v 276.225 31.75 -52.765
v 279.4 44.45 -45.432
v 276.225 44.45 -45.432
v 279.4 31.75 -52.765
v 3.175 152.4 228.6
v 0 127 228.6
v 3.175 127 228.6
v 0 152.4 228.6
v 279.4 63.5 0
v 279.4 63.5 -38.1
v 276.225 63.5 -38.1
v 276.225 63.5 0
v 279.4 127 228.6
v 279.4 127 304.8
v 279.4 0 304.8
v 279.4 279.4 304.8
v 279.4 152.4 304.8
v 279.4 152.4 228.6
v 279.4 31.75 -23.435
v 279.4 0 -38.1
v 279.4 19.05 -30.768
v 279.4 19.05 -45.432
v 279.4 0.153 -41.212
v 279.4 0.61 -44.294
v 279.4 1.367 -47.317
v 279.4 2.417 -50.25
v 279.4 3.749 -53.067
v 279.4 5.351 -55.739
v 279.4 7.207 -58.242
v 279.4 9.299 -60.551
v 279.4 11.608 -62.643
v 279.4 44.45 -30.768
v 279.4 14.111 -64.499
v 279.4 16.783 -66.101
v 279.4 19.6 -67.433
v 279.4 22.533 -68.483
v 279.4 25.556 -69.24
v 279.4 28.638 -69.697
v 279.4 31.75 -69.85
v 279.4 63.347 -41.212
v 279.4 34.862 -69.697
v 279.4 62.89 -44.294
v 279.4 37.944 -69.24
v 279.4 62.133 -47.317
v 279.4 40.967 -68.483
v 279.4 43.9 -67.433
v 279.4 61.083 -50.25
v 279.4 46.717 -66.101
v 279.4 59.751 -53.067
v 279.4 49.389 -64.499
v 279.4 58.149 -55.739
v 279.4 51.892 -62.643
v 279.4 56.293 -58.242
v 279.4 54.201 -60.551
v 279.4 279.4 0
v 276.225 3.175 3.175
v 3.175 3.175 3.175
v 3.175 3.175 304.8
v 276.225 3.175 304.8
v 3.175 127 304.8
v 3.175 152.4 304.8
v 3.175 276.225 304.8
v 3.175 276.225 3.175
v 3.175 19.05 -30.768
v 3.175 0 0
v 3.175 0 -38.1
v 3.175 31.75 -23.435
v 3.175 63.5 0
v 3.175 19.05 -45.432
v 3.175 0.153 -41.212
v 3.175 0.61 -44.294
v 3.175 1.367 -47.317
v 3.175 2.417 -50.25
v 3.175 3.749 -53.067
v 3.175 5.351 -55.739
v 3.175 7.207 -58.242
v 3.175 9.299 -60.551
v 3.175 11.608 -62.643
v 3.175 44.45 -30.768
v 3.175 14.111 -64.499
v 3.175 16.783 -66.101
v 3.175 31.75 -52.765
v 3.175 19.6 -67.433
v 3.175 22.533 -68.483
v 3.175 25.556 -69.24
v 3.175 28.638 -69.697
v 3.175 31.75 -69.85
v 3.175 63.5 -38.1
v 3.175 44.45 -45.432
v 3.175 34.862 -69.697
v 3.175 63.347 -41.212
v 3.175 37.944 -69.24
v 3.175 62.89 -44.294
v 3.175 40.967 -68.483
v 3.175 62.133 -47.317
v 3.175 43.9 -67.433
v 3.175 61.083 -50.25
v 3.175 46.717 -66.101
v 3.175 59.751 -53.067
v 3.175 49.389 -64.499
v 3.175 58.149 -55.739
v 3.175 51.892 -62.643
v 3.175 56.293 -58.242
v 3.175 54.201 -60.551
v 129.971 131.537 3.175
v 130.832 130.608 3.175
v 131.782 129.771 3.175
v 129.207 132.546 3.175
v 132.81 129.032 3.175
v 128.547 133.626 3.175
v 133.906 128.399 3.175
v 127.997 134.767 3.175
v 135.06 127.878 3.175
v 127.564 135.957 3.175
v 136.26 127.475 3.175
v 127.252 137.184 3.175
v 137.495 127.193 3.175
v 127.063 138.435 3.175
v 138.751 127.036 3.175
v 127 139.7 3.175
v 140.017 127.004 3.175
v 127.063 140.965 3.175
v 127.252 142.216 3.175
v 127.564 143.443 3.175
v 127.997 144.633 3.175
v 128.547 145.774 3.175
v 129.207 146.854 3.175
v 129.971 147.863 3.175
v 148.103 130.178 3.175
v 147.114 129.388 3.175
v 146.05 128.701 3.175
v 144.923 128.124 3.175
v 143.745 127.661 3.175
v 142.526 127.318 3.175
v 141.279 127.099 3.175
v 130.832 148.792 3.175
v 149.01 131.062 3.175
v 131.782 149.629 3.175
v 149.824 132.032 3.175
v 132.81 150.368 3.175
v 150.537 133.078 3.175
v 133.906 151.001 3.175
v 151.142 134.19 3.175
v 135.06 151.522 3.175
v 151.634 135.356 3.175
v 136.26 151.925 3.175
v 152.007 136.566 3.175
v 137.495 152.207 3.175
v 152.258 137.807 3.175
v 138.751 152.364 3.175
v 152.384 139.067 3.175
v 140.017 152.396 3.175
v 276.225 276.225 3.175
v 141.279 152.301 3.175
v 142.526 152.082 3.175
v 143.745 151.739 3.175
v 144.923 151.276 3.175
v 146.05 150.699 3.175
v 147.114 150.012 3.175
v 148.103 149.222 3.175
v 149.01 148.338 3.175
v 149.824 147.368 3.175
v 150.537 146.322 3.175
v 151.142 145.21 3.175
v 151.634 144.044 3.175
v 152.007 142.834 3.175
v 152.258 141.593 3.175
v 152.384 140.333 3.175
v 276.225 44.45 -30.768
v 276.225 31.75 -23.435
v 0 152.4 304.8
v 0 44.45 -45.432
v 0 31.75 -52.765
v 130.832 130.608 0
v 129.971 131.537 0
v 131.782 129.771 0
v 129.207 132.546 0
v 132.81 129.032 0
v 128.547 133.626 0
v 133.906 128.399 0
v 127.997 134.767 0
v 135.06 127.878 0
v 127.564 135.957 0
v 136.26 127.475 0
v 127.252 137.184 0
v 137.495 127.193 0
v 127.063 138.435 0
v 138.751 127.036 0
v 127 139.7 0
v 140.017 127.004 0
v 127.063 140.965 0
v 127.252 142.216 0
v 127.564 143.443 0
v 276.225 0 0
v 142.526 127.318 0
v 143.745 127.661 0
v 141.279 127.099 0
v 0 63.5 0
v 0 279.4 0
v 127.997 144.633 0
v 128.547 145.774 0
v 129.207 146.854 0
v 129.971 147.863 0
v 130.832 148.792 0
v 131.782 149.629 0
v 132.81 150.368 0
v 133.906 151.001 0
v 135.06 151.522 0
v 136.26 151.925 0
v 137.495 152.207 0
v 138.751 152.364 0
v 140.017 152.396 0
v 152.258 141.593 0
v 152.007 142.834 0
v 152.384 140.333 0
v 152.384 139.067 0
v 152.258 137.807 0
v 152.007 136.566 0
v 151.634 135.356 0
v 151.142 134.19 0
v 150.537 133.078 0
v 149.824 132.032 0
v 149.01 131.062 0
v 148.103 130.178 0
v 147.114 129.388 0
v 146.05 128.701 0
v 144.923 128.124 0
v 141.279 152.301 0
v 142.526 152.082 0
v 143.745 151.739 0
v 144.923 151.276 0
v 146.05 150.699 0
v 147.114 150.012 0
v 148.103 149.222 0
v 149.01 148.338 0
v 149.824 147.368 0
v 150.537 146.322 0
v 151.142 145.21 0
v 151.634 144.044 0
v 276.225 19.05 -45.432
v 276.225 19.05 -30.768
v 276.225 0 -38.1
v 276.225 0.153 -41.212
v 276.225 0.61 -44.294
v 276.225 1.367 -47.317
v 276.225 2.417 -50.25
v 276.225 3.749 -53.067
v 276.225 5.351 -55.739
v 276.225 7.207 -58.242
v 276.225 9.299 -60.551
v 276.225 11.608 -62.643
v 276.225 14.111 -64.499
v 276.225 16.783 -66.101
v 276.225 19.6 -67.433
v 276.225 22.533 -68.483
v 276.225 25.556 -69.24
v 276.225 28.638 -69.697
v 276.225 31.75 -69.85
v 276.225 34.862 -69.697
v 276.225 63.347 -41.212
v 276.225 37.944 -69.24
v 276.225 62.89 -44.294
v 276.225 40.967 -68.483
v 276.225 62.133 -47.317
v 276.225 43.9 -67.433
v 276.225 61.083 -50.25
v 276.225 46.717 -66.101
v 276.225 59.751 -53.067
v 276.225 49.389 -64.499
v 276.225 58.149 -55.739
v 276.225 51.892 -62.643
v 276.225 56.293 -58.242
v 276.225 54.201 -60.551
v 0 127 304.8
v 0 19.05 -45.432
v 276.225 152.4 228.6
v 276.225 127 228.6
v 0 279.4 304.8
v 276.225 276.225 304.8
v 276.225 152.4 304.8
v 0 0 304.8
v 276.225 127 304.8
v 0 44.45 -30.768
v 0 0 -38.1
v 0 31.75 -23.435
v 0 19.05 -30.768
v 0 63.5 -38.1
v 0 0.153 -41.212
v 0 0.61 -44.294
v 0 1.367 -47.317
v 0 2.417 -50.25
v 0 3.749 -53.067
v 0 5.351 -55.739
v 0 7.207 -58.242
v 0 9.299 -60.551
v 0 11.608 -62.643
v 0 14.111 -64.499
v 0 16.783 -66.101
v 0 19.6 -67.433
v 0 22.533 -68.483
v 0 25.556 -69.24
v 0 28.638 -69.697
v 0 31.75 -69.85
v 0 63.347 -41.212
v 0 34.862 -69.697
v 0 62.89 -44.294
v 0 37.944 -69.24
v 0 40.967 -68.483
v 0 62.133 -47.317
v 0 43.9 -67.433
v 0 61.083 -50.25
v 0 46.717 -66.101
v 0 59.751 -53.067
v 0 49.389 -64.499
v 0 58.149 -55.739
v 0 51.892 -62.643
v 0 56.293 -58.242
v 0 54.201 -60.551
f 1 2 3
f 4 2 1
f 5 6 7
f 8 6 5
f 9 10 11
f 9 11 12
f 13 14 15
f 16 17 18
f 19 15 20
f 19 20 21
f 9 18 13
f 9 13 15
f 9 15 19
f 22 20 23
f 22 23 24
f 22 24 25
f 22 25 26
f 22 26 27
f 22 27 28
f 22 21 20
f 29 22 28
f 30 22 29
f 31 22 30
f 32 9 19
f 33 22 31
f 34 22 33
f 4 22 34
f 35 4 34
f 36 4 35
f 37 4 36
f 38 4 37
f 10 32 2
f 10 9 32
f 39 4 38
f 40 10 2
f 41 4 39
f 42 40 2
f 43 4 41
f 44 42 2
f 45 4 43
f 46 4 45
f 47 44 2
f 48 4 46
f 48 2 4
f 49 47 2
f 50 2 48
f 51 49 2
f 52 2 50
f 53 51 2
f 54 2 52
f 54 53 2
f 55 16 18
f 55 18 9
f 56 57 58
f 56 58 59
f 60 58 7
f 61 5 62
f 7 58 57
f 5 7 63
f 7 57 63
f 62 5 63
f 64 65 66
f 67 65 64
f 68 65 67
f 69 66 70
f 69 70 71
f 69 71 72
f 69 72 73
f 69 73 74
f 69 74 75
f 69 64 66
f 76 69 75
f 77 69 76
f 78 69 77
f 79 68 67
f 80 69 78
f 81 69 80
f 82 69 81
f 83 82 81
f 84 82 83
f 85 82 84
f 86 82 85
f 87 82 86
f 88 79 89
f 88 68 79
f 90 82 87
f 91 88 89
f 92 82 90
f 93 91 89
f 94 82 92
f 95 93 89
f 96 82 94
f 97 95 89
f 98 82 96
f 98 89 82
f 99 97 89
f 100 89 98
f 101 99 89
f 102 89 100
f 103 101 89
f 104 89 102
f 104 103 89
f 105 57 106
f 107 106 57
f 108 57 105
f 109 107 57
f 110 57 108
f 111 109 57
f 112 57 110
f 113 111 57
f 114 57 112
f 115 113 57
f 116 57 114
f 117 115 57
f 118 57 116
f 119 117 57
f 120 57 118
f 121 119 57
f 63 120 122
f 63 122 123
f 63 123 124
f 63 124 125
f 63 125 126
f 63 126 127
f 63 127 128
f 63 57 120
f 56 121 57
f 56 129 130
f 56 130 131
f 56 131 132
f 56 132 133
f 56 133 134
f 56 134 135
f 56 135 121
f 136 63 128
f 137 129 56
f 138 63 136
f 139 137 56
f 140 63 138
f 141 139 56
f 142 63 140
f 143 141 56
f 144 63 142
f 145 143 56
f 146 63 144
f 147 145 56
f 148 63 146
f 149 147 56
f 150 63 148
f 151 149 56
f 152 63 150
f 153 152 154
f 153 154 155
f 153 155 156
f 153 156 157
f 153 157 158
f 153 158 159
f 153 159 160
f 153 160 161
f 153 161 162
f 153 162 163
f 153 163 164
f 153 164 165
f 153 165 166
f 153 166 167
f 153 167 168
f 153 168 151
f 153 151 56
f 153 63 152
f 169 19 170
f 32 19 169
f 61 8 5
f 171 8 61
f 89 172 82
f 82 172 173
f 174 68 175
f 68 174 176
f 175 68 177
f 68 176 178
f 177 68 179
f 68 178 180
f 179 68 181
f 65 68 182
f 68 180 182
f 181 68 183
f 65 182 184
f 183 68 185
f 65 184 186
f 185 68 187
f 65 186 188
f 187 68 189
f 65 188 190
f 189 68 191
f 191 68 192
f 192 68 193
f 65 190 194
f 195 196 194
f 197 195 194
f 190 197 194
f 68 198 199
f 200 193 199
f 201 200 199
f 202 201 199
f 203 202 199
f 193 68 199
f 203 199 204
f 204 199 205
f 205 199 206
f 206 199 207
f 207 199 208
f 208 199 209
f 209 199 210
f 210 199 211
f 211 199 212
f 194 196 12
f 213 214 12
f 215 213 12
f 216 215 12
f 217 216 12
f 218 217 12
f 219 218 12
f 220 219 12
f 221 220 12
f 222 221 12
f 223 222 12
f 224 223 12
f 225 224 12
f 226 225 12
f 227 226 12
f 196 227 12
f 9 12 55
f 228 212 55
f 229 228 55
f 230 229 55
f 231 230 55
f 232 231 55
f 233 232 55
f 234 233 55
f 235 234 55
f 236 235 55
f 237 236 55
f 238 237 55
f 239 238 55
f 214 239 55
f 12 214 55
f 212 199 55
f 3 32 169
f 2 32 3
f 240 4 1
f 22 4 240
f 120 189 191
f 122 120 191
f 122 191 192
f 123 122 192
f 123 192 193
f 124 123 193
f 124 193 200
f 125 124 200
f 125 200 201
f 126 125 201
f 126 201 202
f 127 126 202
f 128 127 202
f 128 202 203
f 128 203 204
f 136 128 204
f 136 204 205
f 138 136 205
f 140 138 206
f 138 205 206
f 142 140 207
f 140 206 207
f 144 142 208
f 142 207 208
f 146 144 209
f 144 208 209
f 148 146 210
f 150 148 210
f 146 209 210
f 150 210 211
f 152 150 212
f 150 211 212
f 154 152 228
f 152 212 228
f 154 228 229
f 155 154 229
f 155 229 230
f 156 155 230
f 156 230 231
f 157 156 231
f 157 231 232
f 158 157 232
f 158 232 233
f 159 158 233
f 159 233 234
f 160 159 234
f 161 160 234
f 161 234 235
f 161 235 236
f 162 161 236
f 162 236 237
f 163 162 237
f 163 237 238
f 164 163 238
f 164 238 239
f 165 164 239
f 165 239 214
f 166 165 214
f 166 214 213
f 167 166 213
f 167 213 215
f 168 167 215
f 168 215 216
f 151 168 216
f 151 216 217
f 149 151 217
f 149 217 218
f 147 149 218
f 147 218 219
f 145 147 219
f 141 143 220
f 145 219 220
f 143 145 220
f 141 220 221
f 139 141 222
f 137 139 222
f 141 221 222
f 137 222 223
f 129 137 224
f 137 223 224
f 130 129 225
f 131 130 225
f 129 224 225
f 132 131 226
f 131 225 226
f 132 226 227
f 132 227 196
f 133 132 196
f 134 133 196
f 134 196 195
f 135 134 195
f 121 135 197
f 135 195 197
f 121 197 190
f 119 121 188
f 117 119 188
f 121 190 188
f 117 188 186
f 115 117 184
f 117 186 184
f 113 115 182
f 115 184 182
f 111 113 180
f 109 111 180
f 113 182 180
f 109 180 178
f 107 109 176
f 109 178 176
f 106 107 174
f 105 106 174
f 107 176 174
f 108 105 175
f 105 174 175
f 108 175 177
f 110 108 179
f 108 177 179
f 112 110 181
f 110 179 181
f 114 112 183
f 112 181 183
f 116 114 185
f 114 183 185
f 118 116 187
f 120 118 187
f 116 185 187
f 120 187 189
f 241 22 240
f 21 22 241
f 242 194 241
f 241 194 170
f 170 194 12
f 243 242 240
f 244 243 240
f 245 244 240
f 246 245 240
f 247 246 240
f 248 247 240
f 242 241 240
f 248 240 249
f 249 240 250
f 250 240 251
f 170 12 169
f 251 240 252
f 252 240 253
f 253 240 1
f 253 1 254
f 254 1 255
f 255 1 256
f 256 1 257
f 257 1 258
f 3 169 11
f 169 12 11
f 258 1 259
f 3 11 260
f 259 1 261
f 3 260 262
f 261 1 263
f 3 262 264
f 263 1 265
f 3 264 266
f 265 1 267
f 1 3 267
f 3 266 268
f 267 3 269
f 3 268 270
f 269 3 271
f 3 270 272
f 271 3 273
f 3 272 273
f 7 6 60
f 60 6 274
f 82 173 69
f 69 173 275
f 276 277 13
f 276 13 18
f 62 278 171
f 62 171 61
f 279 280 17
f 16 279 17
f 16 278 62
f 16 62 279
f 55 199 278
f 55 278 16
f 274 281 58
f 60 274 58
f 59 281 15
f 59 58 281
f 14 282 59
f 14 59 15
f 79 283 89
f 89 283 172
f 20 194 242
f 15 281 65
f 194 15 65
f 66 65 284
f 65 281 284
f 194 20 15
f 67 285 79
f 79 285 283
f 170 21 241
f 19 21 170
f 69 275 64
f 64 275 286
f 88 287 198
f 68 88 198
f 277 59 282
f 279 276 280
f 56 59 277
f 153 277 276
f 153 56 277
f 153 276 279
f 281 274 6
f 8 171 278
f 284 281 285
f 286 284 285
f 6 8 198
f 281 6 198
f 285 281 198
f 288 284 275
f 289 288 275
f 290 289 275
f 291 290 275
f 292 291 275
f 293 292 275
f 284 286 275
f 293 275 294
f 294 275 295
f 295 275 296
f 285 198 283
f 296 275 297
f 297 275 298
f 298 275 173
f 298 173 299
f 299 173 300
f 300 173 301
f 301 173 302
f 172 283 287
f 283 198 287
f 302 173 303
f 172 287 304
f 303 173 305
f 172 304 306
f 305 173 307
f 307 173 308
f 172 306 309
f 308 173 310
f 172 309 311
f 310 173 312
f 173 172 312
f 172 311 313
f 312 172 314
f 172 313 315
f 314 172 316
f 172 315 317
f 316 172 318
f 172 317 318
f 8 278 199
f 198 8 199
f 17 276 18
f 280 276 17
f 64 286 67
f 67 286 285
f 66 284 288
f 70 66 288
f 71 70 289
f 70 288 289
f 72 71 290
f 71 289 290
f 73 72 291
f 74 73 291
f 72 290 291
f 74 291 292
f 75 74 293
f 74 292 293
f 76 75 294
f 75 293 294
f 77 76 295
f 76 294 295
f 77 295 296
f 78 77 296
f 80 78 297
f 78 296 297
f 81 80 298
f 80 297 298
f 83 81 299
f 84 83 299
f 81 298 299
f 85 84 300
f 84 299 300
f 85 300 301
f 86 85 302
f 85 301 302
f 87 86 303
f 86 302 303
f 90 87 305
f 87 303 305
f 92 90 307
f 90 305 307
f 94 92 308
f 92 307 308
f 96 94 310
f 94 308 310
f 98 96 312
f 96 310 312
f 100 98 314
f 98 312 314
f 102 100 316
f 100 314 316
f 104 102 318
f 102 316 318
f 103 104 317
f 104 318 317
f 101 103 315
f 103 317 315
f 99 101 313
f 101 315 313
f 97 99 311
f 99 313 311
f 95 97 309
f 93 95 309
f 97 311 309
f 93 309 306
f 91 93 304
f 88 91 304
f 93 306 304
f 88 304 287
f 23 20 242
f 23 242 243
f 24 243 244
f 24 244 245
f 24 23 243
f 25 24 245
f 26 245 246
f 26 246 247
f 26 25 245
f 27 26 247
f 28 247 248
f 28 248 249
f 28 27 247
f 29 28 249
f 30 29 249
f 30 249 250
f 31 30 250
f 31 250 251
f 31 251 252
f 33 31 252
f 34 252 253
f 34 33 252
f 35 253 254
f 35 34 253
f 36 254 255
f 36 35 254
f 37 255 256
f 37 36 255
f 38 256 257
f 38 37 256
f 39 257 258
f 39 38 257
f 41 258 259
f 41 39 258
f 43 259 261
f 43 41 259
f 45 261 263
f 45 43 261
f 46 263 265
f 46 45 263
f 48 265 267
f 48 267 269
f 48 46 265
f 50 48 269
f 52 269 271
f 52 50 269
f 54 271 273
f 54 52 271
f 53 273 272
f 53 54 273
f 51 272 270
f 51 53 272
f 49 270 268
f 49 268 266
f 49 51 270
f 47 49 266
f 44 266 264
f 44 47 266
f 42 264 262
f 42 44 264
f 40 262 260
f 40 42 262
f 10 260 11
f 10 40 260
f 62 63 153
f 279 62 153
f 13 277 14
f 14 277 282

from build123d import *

# Parameters (mm, degrees)
SKETCH2_W           = 279.4
SKETCH2_H           = 279.4
BOSS_EXTRUDE2_DEPTH = 304.8
SHELL2_T            = -3.175
SKETCH4_W           = 76.2
SKETCH4_H           = 25.4
CUT_EXTRUDE2_DEPTH  = 280.4
BOSS_EXTRUDE5_DEPTH = 3.175
SKETCH6_R           = 12.7
CUT_EXTRUDE3_DEPTH  = 305.8


with BuildPart() as part:
    # Sketch2 → Boss-Extrude2 (new body)
    with BuildSketch(Plane.XY):
        with Locations((139.7, 139.7)):
            Rectangle(SKETCH2_W, SKETCH2_H)
    extrude(amount=BOSS_EXTRUDE2_DEPTH)

    # Shell2
    shell2_openings = [part.faces().sort_by_distance(p)[0] for p in [
        (139.7, 139.7, 304.8),
    ]]
    offset(amount=SHELL2_T, openings=shell2_openings, kind=Kind.INTERSECTION)

    # Sketch4 → Cut-Extrude2 (cut, through all)
    with BuildSketch(Plane.ZY):
        with Locations((266.7, 139.7)):
            Rectangle(SKETCH4_W, SKETCH4_H)
    extrude(amount=-CUT_EXTRUDE2_DEPTH, mode=Mode.SUBTRACT)

    # Sketch5 → Boss-Extrude5 (add)
    with BuildSketch(Plane(origin=(279.4, 0, 0), x_dir=(0, 0, -1), z_dir=(1, 0, 0))):
        Polygon((0, 63.5), (0, 0), (38.1, 0), (38.1, 19.05), (30.767651581, 19.05), (23.435303163, 31.75), (30.767651581, 44.45), (38.1, 44.45), (38.1, 63.5), align=None)
        with BuildLine():
            Line((38.1, 19.05), (38.1, 0))
            ThreePointArc((38.1, 0), (69.85, 31.75), (38.1, 63.5))
            Line((38.1, 63.5), (38.1, 44.45))
            Line((38.1, 44.45), (45.432348419, 44.45))
            Line((45.432348419, 44.45), (52.764696837, 31.75))
            Line((52.764696837, 31.75), (45.432348419, 19.05))
            Line((45.432348419, 19.05), (38.1, 19.05))
        make_face()
    boss_extrude5 = extrude(amount=-BOSS_EXTRUDE5_DEPTH)

    # Mirror1: Boss-Extrude5 across plane
    add(boss_extrude5.mirror(Plane(origin=(139.7, 0, 0), x_dir=(0, 0, 1), z_dir=(1, 0, 0))))

    # Sketch6 → Cut-Extrude3 (cut, through all)
    with BuildSketch(Plane(origin=(0, 0, 0), x_dir=(-1, 0, 0), z_dir=(0, 0, -1))):
        with Locations((-139.7, 139.7)):
            Circle(SKETCH6_R)
    extrude(amount=-CUT_EXTRUDE3_DEPTH, mode=Mode.SUBTRACT)


solid = part.part
